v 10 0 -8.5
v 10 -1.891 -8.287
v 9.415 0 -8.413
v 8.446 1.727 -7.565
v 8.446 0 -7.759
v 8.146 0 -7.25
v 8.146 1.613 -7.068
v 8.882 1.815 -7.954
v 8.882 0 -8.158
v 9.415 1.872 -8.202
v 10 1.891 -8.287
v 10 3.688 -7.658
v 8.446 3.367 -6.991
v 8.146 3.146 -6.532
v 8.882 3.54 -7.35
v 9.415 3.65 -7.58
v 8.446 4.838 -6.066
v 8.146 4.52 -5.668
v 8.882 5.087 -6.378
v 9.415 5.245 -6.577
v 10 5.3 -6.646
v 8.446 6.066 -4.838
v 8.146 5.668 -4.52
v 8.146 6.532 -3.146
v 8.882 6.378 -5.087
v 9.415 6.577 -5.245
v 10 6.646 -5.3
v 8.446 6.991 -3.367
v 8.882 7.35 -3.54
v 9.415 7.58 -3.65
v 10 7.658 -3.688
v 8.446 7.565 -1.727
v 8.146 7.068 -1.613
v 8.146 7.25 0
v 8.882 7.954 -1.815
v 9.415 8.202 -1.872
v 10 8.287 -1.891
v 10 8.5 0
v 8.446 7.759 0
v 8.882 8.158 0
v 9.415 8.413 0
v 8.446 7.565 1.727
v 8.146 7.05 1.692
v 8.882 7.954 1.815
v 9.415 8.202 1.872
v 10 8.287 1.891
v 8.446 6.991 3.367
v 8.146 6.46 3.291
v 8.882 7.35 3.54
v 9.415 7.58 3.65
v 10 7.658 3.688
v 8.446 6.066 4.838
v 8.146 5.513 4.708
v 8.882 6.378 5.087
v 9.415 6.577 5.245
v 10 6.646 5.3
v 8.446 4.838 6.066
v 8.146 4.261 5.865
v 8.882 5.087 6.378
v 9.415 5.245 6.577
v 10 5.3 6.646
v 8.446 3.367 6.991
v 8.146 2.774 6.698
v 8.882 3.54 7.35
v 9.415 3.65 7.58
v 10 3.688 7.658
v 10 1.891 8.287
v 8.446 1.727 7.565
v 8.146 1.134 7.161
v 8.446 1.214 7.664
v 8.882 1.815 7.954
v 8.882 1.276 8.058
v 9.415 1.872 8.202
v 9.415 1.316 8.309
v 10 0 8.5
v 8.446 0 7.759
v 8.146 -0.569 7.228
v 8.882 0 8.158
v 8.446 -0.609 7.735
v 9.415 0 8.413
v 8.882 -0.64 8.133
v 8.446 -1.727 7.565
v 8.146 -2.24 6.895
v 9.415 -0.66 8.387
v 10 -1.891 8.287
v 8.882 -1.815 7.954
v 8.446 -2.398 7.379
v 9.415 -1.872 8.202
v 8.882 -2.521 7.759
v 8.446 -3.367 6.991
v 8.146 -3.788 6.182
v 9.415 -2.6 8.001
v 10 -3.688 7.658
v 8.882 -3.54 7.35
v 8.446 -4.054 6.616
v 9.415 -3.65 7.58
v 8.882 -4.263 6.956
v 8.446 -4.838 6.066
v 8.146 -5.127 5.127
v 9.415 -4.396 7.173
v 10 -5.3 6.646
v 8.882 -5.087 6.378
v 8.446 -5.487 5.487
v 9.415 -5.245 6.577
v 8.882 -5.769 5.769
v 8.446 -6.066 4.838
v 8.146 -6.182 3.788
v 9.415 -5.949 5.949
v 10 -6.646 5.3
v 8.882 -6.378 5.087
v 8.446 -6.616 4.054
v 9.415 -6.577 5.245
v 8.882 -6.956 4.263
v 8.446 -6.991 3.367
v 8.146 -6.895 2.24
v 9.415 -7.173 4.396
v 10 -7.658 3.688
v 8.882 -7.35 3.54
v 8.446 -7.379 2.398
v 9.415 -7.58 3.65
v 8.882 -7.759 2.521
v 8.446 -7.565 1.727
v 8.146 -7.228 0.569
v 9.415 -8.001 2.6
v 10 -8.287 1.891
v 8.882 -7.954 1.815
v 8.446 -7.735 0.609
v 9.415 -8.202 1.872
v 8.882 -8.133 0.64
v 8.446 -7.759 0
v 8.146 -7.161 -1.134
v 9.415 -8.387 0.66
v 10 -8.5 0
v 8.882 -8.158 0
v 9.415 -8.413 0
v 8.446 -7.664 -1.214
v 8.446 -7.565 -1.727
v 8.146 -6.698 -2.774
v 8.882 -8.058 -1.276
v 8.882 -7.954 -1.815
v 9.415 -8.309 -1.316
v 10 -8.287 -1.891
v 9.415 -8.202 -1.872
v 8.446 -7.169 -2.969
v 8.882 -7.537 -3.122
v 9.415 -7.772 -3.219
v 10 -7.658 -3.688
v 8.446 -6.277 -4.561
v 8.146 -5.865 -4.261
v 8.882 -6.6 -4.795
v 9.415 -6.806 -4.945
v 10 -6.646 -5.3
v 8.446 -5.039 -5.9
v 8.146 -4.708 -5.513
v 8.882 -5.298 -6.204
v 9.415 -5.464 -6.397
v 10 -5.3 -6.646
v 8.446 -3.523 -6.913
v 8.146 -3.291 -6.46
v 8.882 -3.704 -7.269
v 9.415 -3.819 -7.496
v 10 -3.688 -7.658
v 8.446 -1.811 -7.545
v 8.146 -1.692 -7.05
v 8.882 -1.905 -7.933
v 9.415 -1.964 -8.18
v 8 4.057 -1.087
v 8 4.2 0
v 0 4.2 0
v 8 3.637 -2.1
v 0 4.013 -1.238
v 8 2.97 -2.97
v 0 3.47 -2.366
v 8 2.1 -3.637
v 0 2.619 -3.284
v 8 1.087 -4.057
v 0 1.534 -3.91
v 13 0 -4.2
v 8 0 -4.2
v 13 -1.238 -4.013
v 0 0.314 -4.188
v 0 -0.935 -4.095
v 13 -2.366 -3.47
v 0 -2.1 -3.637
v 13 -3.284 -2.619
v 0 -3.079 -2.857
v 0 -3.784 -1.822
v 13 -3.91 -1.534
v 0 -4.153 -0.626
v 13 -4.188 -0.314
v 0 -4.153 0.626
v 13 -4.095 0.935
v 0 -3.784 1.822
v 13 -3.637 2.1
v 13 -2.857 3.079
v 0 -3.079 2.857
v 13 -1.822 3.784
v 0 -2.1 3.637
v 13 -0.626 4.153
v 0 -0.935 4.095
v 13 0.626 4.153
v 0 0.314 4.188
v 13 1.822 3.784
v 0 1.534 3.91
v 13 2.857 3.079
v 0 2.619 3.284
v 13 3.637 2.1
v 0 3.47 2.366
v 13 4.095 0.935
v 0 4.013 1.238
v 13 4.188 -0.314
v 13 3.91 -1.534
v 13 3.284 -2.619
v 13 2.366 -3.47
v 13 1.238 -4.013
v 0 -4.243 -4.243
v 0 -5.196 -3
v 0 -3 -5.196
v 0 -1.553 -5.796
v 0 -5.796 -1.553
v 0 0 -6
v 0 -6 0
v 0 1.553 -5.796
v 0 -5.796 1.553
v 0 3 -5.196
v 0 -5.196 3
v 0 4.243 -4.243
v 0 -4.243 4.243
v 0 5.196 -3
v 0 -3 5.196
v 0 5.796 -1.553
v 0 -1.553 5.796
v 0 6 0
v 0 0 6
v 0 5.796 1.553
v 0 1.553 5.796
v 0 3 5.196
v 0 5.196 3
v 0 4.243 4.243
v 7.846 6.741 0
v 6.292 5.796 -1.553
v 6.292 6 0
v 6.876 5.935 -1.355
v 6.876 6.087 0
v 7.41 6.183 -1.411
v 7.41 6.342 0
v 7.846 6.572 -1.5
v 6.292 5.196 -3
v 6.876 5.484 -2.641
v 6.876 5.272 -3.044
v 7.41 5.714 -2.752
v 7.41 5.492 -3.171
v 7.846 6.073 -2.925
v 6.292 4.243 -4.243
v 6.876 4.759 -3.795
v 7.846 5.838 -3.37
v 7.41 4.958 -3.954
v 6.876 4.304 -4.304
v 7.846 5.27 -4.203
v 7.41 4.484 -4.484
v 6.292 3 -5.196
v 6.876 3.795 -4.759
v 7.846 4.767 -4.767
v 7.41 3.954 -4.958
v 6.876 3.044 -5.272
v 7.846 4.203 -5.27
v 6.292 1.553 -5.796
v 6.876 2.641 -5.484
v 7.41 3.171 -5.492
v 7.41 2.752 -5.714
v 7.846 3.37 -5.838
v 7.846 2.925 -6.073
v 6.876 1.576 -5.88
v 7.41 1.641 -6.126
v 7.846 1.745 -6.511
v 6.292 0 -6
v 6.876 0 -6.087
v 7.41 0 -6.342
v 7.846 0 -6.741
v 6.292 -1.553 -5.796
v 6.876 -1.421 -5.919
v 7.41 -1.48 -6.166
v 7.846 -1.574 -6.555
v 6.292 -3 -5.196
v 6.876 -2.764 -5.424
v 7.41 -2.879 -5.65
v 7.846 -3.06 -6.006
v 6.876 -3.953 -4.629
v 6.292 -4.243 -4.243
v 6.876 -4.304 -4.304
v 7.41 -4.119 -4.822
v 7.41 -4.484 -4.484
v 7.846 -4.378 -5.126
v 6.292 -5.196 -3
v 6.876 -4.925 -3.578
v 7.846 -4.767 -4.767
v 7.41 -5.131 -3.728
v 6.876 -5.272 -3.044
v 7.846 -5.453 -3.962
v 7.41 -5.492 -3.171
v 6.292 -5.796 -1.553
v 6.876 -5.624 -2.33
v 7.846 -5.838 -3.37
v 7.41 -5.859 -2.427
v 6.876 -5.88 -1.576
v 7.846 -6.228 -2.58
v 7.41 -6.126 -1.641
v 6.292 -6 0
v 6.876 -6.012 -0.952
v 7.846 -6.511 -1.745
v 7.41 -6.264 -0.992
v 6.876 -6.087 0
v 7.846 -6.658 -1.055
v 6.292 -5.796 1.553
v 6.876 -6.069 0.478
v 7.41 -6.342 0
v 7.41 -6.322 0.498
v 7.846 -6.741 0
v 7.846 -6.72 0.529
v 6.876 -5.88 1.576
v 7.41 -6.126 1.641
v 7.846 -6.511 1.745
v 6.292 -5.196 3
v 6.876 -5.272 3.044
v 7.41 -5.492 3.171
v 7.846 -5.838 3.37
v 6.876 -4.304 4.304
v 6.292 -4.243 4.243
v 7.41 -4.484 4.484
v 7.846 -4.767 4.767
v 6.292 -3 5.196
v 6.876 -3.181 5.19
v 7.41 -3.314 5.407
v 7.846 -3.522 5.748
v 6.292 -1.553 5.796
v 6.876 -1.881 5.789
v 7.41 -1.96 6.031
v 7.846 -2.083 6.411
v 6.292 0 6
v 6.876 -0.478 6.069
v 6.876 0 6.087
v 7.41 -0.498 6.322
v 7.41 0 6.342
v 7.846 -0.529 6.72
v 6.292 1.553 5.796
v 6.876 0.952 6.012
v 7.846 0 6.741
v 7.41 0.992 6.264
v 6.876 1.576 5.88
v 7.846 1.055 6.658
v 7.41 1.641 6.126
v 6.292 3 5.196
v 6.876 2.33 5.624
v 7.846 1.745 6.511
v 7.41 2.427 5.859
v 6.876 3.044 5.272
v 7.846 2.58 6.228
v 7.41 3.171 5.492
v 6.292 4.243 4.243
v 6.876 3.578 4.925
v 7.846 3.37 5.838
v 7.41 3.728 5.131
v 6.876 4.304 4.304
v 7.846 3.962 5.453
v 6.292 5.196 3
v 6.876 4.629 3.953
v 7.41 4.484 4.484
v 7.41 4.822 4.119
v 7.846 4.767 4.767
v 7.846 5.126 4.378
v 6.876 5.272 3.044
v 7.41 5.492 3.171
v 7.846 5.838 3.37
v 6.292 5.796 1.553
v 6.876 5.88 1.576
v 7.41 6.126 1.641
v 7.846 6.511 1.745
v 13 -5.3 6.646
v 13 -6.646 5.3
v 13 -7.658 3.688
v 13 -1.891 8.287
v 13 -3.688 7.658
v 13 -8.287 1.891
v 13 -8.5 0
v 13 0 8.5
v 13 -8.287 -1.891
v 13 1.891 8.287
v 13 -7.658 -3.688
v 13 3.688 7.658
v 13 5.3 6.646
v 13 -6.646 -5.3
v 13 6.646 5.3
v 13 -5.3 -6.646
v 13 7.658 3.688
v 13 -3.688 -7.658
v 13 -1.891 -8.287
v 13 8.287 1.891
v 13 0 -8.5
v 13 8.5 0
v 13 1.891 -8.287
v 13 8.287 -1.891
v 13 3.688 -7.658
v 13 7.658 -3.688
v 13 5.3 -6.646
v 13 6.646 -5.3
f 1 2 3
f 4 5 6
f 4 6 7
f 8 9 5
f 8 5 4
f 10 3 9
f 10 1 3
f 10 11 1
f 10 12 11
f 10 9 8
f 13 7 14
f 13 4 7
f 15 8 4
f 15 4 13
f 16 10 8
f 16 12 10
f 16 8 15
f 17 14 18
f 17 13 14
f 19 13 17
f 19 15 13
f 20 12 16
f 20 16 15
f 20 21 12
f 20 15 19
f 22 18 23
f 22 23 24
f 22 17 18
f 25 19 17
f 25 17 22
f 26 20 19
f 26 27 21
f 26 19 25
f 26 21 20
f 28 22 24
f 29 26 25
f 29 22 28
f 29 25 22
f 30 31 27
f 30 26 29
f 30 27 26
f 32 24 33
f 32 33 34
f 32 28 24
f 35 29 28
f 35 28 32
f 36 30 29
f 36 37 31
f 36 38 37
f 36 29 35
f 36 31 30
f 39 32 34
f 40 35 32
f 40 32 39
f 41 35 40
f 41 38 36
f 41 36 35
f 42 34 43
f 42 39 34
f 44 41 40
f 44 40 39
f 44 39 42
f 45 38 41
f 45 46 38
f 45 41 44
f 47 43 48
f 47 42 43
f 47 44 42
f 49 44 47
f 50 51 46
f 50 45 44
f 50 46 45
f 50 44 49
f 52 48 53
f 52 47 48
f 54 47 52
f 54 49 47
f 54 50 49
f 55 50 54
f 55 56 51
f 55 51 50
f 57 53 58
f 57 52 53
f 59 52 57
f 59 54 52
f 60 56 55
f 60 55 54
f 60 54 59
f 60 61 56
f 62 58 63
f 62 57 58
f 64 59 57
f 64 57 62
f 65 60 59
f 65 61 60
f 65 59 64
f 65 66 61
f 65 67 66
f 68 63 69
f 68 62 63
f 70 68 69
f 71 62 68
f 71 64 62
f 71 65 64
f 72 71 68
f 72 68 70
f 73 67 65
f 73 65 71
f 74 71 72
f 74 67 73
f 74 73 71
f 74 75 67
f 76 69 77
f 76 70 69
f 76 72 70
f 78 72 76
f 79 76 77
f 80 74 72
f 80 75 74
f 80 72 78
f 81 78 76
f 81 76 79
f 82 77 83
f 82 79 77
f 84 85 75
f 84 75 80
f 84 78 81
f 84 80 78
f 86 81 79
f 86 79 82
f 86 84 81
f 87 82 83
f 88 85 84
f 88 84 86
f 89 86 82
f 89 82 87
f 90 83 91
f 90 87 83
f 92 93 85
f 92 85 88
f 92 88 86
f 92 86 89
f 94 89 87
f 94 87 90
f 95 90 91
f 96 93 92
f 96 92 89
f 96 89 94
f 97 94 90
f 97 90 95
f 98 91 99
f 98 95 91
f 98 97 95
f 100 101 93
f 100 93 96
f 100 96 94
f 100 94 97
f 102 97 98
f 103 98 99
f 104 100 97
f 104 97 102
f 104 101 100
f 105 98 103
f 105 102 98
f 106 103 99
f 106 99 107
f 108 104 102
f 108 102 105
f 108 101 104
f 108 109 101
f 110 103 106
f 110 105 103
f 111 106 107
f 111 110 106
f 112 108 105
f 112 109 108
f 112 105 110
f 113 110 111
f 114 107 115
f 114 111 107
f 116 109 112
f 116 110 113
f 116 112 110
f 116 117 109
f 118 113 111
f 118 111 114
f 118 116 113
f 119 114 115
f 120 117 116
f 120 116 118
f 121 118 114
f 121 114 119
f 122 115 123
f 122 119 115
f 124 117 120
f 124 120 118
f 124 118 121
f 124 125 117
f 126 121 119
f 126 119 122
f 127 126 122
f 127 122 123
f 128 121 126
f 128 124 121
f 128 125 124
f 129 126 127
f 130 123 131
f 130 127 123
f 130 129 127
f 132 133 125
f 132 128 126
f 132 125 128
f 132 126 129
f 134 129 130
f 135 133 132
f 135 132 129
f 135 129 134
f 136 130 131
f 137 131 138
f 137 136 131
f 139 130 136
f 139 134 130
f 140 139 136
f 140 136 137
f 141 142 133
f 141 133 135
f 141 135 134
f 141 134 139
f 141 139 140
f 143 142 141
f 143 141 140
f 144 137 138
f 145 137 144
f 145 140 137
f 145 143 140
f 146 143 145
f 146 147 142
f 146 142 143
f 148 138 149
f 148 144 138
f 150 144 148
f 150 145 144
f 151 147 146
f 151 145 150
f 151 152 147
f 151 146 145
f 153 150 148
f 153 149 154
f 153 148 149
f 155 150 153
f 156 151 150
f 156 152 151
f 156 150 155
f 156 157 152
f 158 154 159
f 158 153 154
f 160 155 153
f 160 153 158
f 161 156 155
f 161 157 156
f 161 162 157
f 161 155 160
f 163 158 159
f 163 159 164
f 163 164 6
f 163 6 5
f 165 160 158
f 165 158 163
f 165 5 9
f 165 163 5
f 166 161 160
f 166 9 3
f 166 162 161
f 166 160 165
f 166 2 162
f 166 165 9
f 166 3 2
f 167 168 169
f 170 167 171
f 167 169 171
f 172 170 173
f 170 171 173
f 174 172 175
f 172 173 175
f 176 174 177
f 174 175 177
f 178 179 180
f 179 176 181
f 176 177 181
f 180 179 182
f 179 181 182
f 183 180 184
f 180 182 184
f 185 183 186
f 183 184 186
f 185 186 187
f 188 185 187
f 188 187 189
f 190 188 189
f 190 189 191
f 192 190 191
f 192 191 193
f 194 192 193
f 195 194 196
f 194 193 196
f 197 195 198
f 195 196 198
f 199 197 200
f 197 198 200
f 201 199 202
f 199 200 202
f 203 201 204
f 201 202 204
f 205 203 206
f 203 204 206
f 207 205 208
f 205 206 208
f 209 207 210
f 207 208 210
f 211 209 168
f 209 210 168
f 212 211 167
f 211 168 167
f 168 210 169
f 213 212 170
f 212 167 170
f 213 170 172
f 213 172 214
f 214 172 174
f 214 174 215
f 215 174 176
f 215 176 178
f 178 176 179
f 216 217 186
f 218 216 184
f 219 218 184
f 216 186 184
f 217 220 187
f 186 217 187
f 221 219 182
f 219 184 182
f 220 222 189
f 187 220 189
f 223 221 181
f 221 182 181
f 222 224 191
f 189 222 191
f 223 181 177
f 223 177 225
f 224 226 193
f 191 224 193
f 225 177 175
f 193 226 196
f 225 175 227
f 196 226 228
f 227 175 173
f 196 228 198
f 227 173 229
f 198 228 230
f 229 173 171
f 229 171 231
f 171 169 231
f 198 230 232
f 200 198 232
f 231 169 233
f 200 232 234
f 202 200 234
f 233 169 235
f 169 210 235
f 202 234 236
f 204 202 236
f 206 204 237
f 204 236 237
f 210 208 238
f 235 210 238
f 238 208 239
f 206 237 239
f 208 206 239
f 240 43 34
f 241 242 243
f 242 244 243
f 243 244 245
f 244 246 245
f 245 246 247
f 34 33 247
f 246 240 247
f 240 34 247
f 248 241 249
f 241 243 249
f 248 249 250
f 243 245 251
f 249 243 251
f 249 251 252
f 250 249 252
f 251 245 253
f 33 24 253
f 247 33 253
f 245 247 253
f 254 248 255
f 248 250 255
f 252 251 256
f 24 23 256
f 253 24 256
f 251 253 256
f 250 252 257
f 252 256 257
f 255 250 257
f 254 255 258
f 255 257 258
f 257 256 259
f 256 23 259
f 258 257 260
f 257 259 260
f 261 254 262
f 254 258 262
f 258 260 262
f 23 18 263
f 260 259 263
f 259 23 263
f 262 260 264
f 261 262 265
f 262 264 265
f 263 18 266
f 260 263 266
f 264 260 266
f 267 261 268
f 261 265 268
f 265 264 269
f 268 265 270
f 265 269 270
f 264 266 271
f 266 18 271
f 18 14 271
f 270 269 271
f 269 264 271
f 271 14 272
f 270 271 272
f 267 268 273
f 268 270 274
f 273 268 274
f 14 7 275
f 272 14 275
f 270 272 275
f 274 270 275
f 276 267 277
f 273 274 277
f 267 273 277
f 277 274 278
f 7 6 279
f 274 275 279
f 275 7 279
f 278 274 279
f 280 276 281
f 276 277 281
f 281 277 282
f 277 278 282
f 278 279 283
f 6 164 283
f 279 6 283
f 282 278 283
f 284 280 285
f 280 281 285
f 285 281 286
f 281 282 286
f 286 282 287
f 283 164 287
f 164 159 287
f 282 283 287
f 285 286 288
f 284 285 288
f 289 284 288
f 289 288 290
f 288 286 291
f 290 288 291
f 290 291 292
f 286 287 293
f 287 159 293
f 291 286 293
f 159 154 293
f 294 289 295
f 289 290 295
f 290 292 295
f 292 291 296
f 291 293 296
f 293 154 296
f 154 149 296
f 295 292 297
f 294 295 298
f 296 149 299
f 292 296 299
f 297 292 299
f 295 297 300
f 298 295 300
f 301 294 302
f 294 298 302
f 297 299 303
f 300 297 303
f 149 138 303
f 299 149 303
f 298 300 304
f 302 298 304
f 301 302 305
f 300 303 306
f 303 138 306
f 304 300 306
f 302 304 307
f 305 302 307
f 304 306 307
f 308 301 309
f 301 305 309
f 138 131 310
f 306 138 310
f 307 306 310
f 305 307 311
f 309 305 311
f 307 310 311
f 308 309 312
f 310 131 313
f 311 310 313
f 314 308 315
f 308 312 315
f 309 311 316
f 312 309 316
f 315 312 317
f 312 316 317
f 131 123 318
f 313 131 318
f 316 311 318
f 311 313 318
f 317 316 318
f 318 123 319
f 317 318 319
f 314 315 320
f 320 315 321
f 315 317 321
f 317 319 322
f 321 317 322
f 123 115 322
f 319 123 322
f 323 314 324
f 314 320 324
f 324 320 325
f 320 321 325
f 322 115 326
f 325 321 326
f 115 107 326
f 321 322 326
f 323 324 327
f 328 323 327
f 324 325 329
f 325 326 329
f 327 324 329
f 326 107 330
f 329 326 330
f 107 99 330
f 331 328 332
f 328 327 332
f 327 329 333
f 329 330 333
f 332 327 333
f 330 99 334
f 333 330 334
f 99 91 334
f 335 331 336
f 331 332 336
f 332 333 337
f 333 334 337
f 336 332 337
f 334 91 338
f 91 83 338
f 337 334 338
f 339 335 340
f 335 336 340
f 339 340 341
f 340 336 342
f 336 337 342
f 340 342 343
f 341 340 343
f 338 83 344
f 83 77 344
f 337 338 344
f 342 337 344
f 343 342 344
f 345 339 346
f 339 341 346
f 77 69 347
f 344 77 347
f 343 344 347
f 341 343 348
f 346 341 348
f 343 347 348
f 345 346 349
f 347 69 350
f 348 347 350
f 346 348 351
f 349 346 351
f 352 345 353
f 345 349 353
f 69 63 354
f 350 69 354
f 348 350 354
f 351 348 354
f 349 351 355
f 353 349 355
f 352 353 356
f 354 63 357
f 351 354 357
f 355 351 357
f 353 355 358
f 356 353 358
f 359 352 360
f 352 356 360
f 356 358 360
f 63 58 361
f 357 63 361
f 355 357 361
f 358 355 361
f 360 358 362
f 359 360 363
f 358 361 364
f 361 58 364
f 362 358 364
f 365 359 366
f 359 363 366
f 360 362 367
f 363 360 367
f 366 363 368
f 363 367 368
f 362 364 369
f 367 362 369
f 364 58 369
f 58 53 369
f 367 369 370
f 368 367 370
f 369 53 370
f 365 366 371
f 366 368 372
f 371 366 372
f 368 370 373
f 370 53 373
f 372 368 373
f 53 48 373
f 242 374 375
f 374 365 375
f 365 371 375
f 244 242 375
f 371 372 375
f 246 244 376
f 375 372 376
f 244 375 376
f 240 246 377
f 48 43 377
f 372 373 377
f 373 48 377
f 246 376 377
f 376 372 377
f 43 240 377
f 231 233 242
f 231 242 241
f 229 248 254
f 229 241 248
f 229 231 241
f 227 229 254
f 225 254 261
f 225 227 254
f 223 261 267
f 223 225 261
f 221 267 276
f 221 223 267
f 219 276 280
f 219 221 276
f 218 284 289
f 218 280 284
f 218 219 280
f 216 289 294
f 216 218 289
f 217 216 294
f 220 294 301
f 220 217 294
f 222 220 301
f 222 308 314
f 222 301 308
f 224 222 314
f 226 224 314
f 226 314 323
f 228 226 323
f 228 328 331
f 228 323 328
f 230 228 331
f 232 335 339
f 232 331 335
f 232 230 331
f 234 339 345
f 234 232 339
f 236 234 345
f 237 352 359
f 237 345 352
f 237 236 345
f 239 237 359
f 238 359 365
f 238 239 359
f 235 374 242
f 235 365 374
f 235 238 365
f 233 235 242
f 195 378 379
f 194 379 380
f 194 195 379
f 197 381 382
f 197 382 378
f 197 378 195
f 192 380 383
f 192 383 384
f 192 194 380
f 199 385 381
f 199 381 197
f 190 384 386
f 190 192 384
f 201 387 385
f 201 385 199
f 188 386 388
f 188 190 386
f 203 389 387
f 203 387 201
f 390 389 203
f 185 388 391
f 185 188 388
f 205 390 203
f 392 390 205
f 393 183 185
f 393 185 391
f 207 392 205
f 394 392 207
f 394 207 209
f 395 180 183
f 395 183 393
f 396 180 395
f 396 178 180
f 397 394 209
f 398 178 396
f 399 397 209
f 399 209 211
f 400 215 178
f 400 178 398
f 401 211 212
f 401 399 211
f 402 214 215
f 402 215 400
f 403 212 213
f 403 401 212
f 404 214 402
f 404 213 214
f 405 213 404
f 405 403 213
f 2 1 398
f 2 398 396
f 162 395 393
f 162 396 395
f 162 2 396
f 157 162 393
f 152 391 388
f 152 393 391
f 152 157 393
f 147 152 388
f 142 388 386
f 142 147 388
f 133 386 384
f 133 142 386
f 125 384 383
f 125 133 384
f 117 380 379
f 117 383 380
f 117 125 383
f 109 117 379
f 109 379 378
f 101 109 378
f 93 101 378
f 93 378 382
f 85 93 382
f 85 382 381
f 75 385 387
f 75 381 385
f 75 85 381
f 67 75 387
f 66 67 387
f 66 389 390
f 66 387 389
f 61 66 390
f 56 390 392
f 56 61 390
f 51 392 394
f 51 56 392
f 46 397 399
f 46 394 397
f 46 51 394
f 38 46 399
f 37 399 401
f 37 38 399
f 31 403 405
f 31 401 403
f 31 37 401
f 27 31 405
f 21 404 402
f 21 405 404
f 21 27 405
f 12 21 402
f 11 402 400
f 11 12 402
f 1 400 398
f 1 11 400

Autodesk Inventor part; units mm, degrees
ref_plane "YZ Plane" through (0, 0, 0) normal (1, 0, 0) x (0, 1, 0)
ref_plane "XZ Plane" through (0, 0, 0) normal (0, 1, 0) x (-1, 0, 0)
ref_plane "XY Plane" through (0, 0, 0) normal (0, 0, 1) x (1, 0, 0)
sketch "Sketch1" plane through (0, 0, 0) normal (1, 0, 0) x (0, 1, 0)
  circle A0 centre (0, 0) radius 4.2
  circle A1 centre (0, 0) radius 6
  dimension "d0" = 8.4
  dimension "d1" = 12
extrude "Extrusion1" add sketch "Sketch1" along normal blind 8
sketch "Sketch2" plane through (8, 0, 0) normal (1, 0, 0) x (0, 0, -1)
  circle A0 centre (0, 0) radius 8.5
  circle A1 centre (0, 0) radius 4.2 projected
  dimension "d4" = 17
extrude "Extrusion2" add sketch "Sketch2" along normal blind 5
fillet "Fillet1" radius 2 2 edges at (8, 0, 8.5) (8, -6, 0)
properties part number "Adaptador_Perno_Cojinete" material "ABS Plastic"
